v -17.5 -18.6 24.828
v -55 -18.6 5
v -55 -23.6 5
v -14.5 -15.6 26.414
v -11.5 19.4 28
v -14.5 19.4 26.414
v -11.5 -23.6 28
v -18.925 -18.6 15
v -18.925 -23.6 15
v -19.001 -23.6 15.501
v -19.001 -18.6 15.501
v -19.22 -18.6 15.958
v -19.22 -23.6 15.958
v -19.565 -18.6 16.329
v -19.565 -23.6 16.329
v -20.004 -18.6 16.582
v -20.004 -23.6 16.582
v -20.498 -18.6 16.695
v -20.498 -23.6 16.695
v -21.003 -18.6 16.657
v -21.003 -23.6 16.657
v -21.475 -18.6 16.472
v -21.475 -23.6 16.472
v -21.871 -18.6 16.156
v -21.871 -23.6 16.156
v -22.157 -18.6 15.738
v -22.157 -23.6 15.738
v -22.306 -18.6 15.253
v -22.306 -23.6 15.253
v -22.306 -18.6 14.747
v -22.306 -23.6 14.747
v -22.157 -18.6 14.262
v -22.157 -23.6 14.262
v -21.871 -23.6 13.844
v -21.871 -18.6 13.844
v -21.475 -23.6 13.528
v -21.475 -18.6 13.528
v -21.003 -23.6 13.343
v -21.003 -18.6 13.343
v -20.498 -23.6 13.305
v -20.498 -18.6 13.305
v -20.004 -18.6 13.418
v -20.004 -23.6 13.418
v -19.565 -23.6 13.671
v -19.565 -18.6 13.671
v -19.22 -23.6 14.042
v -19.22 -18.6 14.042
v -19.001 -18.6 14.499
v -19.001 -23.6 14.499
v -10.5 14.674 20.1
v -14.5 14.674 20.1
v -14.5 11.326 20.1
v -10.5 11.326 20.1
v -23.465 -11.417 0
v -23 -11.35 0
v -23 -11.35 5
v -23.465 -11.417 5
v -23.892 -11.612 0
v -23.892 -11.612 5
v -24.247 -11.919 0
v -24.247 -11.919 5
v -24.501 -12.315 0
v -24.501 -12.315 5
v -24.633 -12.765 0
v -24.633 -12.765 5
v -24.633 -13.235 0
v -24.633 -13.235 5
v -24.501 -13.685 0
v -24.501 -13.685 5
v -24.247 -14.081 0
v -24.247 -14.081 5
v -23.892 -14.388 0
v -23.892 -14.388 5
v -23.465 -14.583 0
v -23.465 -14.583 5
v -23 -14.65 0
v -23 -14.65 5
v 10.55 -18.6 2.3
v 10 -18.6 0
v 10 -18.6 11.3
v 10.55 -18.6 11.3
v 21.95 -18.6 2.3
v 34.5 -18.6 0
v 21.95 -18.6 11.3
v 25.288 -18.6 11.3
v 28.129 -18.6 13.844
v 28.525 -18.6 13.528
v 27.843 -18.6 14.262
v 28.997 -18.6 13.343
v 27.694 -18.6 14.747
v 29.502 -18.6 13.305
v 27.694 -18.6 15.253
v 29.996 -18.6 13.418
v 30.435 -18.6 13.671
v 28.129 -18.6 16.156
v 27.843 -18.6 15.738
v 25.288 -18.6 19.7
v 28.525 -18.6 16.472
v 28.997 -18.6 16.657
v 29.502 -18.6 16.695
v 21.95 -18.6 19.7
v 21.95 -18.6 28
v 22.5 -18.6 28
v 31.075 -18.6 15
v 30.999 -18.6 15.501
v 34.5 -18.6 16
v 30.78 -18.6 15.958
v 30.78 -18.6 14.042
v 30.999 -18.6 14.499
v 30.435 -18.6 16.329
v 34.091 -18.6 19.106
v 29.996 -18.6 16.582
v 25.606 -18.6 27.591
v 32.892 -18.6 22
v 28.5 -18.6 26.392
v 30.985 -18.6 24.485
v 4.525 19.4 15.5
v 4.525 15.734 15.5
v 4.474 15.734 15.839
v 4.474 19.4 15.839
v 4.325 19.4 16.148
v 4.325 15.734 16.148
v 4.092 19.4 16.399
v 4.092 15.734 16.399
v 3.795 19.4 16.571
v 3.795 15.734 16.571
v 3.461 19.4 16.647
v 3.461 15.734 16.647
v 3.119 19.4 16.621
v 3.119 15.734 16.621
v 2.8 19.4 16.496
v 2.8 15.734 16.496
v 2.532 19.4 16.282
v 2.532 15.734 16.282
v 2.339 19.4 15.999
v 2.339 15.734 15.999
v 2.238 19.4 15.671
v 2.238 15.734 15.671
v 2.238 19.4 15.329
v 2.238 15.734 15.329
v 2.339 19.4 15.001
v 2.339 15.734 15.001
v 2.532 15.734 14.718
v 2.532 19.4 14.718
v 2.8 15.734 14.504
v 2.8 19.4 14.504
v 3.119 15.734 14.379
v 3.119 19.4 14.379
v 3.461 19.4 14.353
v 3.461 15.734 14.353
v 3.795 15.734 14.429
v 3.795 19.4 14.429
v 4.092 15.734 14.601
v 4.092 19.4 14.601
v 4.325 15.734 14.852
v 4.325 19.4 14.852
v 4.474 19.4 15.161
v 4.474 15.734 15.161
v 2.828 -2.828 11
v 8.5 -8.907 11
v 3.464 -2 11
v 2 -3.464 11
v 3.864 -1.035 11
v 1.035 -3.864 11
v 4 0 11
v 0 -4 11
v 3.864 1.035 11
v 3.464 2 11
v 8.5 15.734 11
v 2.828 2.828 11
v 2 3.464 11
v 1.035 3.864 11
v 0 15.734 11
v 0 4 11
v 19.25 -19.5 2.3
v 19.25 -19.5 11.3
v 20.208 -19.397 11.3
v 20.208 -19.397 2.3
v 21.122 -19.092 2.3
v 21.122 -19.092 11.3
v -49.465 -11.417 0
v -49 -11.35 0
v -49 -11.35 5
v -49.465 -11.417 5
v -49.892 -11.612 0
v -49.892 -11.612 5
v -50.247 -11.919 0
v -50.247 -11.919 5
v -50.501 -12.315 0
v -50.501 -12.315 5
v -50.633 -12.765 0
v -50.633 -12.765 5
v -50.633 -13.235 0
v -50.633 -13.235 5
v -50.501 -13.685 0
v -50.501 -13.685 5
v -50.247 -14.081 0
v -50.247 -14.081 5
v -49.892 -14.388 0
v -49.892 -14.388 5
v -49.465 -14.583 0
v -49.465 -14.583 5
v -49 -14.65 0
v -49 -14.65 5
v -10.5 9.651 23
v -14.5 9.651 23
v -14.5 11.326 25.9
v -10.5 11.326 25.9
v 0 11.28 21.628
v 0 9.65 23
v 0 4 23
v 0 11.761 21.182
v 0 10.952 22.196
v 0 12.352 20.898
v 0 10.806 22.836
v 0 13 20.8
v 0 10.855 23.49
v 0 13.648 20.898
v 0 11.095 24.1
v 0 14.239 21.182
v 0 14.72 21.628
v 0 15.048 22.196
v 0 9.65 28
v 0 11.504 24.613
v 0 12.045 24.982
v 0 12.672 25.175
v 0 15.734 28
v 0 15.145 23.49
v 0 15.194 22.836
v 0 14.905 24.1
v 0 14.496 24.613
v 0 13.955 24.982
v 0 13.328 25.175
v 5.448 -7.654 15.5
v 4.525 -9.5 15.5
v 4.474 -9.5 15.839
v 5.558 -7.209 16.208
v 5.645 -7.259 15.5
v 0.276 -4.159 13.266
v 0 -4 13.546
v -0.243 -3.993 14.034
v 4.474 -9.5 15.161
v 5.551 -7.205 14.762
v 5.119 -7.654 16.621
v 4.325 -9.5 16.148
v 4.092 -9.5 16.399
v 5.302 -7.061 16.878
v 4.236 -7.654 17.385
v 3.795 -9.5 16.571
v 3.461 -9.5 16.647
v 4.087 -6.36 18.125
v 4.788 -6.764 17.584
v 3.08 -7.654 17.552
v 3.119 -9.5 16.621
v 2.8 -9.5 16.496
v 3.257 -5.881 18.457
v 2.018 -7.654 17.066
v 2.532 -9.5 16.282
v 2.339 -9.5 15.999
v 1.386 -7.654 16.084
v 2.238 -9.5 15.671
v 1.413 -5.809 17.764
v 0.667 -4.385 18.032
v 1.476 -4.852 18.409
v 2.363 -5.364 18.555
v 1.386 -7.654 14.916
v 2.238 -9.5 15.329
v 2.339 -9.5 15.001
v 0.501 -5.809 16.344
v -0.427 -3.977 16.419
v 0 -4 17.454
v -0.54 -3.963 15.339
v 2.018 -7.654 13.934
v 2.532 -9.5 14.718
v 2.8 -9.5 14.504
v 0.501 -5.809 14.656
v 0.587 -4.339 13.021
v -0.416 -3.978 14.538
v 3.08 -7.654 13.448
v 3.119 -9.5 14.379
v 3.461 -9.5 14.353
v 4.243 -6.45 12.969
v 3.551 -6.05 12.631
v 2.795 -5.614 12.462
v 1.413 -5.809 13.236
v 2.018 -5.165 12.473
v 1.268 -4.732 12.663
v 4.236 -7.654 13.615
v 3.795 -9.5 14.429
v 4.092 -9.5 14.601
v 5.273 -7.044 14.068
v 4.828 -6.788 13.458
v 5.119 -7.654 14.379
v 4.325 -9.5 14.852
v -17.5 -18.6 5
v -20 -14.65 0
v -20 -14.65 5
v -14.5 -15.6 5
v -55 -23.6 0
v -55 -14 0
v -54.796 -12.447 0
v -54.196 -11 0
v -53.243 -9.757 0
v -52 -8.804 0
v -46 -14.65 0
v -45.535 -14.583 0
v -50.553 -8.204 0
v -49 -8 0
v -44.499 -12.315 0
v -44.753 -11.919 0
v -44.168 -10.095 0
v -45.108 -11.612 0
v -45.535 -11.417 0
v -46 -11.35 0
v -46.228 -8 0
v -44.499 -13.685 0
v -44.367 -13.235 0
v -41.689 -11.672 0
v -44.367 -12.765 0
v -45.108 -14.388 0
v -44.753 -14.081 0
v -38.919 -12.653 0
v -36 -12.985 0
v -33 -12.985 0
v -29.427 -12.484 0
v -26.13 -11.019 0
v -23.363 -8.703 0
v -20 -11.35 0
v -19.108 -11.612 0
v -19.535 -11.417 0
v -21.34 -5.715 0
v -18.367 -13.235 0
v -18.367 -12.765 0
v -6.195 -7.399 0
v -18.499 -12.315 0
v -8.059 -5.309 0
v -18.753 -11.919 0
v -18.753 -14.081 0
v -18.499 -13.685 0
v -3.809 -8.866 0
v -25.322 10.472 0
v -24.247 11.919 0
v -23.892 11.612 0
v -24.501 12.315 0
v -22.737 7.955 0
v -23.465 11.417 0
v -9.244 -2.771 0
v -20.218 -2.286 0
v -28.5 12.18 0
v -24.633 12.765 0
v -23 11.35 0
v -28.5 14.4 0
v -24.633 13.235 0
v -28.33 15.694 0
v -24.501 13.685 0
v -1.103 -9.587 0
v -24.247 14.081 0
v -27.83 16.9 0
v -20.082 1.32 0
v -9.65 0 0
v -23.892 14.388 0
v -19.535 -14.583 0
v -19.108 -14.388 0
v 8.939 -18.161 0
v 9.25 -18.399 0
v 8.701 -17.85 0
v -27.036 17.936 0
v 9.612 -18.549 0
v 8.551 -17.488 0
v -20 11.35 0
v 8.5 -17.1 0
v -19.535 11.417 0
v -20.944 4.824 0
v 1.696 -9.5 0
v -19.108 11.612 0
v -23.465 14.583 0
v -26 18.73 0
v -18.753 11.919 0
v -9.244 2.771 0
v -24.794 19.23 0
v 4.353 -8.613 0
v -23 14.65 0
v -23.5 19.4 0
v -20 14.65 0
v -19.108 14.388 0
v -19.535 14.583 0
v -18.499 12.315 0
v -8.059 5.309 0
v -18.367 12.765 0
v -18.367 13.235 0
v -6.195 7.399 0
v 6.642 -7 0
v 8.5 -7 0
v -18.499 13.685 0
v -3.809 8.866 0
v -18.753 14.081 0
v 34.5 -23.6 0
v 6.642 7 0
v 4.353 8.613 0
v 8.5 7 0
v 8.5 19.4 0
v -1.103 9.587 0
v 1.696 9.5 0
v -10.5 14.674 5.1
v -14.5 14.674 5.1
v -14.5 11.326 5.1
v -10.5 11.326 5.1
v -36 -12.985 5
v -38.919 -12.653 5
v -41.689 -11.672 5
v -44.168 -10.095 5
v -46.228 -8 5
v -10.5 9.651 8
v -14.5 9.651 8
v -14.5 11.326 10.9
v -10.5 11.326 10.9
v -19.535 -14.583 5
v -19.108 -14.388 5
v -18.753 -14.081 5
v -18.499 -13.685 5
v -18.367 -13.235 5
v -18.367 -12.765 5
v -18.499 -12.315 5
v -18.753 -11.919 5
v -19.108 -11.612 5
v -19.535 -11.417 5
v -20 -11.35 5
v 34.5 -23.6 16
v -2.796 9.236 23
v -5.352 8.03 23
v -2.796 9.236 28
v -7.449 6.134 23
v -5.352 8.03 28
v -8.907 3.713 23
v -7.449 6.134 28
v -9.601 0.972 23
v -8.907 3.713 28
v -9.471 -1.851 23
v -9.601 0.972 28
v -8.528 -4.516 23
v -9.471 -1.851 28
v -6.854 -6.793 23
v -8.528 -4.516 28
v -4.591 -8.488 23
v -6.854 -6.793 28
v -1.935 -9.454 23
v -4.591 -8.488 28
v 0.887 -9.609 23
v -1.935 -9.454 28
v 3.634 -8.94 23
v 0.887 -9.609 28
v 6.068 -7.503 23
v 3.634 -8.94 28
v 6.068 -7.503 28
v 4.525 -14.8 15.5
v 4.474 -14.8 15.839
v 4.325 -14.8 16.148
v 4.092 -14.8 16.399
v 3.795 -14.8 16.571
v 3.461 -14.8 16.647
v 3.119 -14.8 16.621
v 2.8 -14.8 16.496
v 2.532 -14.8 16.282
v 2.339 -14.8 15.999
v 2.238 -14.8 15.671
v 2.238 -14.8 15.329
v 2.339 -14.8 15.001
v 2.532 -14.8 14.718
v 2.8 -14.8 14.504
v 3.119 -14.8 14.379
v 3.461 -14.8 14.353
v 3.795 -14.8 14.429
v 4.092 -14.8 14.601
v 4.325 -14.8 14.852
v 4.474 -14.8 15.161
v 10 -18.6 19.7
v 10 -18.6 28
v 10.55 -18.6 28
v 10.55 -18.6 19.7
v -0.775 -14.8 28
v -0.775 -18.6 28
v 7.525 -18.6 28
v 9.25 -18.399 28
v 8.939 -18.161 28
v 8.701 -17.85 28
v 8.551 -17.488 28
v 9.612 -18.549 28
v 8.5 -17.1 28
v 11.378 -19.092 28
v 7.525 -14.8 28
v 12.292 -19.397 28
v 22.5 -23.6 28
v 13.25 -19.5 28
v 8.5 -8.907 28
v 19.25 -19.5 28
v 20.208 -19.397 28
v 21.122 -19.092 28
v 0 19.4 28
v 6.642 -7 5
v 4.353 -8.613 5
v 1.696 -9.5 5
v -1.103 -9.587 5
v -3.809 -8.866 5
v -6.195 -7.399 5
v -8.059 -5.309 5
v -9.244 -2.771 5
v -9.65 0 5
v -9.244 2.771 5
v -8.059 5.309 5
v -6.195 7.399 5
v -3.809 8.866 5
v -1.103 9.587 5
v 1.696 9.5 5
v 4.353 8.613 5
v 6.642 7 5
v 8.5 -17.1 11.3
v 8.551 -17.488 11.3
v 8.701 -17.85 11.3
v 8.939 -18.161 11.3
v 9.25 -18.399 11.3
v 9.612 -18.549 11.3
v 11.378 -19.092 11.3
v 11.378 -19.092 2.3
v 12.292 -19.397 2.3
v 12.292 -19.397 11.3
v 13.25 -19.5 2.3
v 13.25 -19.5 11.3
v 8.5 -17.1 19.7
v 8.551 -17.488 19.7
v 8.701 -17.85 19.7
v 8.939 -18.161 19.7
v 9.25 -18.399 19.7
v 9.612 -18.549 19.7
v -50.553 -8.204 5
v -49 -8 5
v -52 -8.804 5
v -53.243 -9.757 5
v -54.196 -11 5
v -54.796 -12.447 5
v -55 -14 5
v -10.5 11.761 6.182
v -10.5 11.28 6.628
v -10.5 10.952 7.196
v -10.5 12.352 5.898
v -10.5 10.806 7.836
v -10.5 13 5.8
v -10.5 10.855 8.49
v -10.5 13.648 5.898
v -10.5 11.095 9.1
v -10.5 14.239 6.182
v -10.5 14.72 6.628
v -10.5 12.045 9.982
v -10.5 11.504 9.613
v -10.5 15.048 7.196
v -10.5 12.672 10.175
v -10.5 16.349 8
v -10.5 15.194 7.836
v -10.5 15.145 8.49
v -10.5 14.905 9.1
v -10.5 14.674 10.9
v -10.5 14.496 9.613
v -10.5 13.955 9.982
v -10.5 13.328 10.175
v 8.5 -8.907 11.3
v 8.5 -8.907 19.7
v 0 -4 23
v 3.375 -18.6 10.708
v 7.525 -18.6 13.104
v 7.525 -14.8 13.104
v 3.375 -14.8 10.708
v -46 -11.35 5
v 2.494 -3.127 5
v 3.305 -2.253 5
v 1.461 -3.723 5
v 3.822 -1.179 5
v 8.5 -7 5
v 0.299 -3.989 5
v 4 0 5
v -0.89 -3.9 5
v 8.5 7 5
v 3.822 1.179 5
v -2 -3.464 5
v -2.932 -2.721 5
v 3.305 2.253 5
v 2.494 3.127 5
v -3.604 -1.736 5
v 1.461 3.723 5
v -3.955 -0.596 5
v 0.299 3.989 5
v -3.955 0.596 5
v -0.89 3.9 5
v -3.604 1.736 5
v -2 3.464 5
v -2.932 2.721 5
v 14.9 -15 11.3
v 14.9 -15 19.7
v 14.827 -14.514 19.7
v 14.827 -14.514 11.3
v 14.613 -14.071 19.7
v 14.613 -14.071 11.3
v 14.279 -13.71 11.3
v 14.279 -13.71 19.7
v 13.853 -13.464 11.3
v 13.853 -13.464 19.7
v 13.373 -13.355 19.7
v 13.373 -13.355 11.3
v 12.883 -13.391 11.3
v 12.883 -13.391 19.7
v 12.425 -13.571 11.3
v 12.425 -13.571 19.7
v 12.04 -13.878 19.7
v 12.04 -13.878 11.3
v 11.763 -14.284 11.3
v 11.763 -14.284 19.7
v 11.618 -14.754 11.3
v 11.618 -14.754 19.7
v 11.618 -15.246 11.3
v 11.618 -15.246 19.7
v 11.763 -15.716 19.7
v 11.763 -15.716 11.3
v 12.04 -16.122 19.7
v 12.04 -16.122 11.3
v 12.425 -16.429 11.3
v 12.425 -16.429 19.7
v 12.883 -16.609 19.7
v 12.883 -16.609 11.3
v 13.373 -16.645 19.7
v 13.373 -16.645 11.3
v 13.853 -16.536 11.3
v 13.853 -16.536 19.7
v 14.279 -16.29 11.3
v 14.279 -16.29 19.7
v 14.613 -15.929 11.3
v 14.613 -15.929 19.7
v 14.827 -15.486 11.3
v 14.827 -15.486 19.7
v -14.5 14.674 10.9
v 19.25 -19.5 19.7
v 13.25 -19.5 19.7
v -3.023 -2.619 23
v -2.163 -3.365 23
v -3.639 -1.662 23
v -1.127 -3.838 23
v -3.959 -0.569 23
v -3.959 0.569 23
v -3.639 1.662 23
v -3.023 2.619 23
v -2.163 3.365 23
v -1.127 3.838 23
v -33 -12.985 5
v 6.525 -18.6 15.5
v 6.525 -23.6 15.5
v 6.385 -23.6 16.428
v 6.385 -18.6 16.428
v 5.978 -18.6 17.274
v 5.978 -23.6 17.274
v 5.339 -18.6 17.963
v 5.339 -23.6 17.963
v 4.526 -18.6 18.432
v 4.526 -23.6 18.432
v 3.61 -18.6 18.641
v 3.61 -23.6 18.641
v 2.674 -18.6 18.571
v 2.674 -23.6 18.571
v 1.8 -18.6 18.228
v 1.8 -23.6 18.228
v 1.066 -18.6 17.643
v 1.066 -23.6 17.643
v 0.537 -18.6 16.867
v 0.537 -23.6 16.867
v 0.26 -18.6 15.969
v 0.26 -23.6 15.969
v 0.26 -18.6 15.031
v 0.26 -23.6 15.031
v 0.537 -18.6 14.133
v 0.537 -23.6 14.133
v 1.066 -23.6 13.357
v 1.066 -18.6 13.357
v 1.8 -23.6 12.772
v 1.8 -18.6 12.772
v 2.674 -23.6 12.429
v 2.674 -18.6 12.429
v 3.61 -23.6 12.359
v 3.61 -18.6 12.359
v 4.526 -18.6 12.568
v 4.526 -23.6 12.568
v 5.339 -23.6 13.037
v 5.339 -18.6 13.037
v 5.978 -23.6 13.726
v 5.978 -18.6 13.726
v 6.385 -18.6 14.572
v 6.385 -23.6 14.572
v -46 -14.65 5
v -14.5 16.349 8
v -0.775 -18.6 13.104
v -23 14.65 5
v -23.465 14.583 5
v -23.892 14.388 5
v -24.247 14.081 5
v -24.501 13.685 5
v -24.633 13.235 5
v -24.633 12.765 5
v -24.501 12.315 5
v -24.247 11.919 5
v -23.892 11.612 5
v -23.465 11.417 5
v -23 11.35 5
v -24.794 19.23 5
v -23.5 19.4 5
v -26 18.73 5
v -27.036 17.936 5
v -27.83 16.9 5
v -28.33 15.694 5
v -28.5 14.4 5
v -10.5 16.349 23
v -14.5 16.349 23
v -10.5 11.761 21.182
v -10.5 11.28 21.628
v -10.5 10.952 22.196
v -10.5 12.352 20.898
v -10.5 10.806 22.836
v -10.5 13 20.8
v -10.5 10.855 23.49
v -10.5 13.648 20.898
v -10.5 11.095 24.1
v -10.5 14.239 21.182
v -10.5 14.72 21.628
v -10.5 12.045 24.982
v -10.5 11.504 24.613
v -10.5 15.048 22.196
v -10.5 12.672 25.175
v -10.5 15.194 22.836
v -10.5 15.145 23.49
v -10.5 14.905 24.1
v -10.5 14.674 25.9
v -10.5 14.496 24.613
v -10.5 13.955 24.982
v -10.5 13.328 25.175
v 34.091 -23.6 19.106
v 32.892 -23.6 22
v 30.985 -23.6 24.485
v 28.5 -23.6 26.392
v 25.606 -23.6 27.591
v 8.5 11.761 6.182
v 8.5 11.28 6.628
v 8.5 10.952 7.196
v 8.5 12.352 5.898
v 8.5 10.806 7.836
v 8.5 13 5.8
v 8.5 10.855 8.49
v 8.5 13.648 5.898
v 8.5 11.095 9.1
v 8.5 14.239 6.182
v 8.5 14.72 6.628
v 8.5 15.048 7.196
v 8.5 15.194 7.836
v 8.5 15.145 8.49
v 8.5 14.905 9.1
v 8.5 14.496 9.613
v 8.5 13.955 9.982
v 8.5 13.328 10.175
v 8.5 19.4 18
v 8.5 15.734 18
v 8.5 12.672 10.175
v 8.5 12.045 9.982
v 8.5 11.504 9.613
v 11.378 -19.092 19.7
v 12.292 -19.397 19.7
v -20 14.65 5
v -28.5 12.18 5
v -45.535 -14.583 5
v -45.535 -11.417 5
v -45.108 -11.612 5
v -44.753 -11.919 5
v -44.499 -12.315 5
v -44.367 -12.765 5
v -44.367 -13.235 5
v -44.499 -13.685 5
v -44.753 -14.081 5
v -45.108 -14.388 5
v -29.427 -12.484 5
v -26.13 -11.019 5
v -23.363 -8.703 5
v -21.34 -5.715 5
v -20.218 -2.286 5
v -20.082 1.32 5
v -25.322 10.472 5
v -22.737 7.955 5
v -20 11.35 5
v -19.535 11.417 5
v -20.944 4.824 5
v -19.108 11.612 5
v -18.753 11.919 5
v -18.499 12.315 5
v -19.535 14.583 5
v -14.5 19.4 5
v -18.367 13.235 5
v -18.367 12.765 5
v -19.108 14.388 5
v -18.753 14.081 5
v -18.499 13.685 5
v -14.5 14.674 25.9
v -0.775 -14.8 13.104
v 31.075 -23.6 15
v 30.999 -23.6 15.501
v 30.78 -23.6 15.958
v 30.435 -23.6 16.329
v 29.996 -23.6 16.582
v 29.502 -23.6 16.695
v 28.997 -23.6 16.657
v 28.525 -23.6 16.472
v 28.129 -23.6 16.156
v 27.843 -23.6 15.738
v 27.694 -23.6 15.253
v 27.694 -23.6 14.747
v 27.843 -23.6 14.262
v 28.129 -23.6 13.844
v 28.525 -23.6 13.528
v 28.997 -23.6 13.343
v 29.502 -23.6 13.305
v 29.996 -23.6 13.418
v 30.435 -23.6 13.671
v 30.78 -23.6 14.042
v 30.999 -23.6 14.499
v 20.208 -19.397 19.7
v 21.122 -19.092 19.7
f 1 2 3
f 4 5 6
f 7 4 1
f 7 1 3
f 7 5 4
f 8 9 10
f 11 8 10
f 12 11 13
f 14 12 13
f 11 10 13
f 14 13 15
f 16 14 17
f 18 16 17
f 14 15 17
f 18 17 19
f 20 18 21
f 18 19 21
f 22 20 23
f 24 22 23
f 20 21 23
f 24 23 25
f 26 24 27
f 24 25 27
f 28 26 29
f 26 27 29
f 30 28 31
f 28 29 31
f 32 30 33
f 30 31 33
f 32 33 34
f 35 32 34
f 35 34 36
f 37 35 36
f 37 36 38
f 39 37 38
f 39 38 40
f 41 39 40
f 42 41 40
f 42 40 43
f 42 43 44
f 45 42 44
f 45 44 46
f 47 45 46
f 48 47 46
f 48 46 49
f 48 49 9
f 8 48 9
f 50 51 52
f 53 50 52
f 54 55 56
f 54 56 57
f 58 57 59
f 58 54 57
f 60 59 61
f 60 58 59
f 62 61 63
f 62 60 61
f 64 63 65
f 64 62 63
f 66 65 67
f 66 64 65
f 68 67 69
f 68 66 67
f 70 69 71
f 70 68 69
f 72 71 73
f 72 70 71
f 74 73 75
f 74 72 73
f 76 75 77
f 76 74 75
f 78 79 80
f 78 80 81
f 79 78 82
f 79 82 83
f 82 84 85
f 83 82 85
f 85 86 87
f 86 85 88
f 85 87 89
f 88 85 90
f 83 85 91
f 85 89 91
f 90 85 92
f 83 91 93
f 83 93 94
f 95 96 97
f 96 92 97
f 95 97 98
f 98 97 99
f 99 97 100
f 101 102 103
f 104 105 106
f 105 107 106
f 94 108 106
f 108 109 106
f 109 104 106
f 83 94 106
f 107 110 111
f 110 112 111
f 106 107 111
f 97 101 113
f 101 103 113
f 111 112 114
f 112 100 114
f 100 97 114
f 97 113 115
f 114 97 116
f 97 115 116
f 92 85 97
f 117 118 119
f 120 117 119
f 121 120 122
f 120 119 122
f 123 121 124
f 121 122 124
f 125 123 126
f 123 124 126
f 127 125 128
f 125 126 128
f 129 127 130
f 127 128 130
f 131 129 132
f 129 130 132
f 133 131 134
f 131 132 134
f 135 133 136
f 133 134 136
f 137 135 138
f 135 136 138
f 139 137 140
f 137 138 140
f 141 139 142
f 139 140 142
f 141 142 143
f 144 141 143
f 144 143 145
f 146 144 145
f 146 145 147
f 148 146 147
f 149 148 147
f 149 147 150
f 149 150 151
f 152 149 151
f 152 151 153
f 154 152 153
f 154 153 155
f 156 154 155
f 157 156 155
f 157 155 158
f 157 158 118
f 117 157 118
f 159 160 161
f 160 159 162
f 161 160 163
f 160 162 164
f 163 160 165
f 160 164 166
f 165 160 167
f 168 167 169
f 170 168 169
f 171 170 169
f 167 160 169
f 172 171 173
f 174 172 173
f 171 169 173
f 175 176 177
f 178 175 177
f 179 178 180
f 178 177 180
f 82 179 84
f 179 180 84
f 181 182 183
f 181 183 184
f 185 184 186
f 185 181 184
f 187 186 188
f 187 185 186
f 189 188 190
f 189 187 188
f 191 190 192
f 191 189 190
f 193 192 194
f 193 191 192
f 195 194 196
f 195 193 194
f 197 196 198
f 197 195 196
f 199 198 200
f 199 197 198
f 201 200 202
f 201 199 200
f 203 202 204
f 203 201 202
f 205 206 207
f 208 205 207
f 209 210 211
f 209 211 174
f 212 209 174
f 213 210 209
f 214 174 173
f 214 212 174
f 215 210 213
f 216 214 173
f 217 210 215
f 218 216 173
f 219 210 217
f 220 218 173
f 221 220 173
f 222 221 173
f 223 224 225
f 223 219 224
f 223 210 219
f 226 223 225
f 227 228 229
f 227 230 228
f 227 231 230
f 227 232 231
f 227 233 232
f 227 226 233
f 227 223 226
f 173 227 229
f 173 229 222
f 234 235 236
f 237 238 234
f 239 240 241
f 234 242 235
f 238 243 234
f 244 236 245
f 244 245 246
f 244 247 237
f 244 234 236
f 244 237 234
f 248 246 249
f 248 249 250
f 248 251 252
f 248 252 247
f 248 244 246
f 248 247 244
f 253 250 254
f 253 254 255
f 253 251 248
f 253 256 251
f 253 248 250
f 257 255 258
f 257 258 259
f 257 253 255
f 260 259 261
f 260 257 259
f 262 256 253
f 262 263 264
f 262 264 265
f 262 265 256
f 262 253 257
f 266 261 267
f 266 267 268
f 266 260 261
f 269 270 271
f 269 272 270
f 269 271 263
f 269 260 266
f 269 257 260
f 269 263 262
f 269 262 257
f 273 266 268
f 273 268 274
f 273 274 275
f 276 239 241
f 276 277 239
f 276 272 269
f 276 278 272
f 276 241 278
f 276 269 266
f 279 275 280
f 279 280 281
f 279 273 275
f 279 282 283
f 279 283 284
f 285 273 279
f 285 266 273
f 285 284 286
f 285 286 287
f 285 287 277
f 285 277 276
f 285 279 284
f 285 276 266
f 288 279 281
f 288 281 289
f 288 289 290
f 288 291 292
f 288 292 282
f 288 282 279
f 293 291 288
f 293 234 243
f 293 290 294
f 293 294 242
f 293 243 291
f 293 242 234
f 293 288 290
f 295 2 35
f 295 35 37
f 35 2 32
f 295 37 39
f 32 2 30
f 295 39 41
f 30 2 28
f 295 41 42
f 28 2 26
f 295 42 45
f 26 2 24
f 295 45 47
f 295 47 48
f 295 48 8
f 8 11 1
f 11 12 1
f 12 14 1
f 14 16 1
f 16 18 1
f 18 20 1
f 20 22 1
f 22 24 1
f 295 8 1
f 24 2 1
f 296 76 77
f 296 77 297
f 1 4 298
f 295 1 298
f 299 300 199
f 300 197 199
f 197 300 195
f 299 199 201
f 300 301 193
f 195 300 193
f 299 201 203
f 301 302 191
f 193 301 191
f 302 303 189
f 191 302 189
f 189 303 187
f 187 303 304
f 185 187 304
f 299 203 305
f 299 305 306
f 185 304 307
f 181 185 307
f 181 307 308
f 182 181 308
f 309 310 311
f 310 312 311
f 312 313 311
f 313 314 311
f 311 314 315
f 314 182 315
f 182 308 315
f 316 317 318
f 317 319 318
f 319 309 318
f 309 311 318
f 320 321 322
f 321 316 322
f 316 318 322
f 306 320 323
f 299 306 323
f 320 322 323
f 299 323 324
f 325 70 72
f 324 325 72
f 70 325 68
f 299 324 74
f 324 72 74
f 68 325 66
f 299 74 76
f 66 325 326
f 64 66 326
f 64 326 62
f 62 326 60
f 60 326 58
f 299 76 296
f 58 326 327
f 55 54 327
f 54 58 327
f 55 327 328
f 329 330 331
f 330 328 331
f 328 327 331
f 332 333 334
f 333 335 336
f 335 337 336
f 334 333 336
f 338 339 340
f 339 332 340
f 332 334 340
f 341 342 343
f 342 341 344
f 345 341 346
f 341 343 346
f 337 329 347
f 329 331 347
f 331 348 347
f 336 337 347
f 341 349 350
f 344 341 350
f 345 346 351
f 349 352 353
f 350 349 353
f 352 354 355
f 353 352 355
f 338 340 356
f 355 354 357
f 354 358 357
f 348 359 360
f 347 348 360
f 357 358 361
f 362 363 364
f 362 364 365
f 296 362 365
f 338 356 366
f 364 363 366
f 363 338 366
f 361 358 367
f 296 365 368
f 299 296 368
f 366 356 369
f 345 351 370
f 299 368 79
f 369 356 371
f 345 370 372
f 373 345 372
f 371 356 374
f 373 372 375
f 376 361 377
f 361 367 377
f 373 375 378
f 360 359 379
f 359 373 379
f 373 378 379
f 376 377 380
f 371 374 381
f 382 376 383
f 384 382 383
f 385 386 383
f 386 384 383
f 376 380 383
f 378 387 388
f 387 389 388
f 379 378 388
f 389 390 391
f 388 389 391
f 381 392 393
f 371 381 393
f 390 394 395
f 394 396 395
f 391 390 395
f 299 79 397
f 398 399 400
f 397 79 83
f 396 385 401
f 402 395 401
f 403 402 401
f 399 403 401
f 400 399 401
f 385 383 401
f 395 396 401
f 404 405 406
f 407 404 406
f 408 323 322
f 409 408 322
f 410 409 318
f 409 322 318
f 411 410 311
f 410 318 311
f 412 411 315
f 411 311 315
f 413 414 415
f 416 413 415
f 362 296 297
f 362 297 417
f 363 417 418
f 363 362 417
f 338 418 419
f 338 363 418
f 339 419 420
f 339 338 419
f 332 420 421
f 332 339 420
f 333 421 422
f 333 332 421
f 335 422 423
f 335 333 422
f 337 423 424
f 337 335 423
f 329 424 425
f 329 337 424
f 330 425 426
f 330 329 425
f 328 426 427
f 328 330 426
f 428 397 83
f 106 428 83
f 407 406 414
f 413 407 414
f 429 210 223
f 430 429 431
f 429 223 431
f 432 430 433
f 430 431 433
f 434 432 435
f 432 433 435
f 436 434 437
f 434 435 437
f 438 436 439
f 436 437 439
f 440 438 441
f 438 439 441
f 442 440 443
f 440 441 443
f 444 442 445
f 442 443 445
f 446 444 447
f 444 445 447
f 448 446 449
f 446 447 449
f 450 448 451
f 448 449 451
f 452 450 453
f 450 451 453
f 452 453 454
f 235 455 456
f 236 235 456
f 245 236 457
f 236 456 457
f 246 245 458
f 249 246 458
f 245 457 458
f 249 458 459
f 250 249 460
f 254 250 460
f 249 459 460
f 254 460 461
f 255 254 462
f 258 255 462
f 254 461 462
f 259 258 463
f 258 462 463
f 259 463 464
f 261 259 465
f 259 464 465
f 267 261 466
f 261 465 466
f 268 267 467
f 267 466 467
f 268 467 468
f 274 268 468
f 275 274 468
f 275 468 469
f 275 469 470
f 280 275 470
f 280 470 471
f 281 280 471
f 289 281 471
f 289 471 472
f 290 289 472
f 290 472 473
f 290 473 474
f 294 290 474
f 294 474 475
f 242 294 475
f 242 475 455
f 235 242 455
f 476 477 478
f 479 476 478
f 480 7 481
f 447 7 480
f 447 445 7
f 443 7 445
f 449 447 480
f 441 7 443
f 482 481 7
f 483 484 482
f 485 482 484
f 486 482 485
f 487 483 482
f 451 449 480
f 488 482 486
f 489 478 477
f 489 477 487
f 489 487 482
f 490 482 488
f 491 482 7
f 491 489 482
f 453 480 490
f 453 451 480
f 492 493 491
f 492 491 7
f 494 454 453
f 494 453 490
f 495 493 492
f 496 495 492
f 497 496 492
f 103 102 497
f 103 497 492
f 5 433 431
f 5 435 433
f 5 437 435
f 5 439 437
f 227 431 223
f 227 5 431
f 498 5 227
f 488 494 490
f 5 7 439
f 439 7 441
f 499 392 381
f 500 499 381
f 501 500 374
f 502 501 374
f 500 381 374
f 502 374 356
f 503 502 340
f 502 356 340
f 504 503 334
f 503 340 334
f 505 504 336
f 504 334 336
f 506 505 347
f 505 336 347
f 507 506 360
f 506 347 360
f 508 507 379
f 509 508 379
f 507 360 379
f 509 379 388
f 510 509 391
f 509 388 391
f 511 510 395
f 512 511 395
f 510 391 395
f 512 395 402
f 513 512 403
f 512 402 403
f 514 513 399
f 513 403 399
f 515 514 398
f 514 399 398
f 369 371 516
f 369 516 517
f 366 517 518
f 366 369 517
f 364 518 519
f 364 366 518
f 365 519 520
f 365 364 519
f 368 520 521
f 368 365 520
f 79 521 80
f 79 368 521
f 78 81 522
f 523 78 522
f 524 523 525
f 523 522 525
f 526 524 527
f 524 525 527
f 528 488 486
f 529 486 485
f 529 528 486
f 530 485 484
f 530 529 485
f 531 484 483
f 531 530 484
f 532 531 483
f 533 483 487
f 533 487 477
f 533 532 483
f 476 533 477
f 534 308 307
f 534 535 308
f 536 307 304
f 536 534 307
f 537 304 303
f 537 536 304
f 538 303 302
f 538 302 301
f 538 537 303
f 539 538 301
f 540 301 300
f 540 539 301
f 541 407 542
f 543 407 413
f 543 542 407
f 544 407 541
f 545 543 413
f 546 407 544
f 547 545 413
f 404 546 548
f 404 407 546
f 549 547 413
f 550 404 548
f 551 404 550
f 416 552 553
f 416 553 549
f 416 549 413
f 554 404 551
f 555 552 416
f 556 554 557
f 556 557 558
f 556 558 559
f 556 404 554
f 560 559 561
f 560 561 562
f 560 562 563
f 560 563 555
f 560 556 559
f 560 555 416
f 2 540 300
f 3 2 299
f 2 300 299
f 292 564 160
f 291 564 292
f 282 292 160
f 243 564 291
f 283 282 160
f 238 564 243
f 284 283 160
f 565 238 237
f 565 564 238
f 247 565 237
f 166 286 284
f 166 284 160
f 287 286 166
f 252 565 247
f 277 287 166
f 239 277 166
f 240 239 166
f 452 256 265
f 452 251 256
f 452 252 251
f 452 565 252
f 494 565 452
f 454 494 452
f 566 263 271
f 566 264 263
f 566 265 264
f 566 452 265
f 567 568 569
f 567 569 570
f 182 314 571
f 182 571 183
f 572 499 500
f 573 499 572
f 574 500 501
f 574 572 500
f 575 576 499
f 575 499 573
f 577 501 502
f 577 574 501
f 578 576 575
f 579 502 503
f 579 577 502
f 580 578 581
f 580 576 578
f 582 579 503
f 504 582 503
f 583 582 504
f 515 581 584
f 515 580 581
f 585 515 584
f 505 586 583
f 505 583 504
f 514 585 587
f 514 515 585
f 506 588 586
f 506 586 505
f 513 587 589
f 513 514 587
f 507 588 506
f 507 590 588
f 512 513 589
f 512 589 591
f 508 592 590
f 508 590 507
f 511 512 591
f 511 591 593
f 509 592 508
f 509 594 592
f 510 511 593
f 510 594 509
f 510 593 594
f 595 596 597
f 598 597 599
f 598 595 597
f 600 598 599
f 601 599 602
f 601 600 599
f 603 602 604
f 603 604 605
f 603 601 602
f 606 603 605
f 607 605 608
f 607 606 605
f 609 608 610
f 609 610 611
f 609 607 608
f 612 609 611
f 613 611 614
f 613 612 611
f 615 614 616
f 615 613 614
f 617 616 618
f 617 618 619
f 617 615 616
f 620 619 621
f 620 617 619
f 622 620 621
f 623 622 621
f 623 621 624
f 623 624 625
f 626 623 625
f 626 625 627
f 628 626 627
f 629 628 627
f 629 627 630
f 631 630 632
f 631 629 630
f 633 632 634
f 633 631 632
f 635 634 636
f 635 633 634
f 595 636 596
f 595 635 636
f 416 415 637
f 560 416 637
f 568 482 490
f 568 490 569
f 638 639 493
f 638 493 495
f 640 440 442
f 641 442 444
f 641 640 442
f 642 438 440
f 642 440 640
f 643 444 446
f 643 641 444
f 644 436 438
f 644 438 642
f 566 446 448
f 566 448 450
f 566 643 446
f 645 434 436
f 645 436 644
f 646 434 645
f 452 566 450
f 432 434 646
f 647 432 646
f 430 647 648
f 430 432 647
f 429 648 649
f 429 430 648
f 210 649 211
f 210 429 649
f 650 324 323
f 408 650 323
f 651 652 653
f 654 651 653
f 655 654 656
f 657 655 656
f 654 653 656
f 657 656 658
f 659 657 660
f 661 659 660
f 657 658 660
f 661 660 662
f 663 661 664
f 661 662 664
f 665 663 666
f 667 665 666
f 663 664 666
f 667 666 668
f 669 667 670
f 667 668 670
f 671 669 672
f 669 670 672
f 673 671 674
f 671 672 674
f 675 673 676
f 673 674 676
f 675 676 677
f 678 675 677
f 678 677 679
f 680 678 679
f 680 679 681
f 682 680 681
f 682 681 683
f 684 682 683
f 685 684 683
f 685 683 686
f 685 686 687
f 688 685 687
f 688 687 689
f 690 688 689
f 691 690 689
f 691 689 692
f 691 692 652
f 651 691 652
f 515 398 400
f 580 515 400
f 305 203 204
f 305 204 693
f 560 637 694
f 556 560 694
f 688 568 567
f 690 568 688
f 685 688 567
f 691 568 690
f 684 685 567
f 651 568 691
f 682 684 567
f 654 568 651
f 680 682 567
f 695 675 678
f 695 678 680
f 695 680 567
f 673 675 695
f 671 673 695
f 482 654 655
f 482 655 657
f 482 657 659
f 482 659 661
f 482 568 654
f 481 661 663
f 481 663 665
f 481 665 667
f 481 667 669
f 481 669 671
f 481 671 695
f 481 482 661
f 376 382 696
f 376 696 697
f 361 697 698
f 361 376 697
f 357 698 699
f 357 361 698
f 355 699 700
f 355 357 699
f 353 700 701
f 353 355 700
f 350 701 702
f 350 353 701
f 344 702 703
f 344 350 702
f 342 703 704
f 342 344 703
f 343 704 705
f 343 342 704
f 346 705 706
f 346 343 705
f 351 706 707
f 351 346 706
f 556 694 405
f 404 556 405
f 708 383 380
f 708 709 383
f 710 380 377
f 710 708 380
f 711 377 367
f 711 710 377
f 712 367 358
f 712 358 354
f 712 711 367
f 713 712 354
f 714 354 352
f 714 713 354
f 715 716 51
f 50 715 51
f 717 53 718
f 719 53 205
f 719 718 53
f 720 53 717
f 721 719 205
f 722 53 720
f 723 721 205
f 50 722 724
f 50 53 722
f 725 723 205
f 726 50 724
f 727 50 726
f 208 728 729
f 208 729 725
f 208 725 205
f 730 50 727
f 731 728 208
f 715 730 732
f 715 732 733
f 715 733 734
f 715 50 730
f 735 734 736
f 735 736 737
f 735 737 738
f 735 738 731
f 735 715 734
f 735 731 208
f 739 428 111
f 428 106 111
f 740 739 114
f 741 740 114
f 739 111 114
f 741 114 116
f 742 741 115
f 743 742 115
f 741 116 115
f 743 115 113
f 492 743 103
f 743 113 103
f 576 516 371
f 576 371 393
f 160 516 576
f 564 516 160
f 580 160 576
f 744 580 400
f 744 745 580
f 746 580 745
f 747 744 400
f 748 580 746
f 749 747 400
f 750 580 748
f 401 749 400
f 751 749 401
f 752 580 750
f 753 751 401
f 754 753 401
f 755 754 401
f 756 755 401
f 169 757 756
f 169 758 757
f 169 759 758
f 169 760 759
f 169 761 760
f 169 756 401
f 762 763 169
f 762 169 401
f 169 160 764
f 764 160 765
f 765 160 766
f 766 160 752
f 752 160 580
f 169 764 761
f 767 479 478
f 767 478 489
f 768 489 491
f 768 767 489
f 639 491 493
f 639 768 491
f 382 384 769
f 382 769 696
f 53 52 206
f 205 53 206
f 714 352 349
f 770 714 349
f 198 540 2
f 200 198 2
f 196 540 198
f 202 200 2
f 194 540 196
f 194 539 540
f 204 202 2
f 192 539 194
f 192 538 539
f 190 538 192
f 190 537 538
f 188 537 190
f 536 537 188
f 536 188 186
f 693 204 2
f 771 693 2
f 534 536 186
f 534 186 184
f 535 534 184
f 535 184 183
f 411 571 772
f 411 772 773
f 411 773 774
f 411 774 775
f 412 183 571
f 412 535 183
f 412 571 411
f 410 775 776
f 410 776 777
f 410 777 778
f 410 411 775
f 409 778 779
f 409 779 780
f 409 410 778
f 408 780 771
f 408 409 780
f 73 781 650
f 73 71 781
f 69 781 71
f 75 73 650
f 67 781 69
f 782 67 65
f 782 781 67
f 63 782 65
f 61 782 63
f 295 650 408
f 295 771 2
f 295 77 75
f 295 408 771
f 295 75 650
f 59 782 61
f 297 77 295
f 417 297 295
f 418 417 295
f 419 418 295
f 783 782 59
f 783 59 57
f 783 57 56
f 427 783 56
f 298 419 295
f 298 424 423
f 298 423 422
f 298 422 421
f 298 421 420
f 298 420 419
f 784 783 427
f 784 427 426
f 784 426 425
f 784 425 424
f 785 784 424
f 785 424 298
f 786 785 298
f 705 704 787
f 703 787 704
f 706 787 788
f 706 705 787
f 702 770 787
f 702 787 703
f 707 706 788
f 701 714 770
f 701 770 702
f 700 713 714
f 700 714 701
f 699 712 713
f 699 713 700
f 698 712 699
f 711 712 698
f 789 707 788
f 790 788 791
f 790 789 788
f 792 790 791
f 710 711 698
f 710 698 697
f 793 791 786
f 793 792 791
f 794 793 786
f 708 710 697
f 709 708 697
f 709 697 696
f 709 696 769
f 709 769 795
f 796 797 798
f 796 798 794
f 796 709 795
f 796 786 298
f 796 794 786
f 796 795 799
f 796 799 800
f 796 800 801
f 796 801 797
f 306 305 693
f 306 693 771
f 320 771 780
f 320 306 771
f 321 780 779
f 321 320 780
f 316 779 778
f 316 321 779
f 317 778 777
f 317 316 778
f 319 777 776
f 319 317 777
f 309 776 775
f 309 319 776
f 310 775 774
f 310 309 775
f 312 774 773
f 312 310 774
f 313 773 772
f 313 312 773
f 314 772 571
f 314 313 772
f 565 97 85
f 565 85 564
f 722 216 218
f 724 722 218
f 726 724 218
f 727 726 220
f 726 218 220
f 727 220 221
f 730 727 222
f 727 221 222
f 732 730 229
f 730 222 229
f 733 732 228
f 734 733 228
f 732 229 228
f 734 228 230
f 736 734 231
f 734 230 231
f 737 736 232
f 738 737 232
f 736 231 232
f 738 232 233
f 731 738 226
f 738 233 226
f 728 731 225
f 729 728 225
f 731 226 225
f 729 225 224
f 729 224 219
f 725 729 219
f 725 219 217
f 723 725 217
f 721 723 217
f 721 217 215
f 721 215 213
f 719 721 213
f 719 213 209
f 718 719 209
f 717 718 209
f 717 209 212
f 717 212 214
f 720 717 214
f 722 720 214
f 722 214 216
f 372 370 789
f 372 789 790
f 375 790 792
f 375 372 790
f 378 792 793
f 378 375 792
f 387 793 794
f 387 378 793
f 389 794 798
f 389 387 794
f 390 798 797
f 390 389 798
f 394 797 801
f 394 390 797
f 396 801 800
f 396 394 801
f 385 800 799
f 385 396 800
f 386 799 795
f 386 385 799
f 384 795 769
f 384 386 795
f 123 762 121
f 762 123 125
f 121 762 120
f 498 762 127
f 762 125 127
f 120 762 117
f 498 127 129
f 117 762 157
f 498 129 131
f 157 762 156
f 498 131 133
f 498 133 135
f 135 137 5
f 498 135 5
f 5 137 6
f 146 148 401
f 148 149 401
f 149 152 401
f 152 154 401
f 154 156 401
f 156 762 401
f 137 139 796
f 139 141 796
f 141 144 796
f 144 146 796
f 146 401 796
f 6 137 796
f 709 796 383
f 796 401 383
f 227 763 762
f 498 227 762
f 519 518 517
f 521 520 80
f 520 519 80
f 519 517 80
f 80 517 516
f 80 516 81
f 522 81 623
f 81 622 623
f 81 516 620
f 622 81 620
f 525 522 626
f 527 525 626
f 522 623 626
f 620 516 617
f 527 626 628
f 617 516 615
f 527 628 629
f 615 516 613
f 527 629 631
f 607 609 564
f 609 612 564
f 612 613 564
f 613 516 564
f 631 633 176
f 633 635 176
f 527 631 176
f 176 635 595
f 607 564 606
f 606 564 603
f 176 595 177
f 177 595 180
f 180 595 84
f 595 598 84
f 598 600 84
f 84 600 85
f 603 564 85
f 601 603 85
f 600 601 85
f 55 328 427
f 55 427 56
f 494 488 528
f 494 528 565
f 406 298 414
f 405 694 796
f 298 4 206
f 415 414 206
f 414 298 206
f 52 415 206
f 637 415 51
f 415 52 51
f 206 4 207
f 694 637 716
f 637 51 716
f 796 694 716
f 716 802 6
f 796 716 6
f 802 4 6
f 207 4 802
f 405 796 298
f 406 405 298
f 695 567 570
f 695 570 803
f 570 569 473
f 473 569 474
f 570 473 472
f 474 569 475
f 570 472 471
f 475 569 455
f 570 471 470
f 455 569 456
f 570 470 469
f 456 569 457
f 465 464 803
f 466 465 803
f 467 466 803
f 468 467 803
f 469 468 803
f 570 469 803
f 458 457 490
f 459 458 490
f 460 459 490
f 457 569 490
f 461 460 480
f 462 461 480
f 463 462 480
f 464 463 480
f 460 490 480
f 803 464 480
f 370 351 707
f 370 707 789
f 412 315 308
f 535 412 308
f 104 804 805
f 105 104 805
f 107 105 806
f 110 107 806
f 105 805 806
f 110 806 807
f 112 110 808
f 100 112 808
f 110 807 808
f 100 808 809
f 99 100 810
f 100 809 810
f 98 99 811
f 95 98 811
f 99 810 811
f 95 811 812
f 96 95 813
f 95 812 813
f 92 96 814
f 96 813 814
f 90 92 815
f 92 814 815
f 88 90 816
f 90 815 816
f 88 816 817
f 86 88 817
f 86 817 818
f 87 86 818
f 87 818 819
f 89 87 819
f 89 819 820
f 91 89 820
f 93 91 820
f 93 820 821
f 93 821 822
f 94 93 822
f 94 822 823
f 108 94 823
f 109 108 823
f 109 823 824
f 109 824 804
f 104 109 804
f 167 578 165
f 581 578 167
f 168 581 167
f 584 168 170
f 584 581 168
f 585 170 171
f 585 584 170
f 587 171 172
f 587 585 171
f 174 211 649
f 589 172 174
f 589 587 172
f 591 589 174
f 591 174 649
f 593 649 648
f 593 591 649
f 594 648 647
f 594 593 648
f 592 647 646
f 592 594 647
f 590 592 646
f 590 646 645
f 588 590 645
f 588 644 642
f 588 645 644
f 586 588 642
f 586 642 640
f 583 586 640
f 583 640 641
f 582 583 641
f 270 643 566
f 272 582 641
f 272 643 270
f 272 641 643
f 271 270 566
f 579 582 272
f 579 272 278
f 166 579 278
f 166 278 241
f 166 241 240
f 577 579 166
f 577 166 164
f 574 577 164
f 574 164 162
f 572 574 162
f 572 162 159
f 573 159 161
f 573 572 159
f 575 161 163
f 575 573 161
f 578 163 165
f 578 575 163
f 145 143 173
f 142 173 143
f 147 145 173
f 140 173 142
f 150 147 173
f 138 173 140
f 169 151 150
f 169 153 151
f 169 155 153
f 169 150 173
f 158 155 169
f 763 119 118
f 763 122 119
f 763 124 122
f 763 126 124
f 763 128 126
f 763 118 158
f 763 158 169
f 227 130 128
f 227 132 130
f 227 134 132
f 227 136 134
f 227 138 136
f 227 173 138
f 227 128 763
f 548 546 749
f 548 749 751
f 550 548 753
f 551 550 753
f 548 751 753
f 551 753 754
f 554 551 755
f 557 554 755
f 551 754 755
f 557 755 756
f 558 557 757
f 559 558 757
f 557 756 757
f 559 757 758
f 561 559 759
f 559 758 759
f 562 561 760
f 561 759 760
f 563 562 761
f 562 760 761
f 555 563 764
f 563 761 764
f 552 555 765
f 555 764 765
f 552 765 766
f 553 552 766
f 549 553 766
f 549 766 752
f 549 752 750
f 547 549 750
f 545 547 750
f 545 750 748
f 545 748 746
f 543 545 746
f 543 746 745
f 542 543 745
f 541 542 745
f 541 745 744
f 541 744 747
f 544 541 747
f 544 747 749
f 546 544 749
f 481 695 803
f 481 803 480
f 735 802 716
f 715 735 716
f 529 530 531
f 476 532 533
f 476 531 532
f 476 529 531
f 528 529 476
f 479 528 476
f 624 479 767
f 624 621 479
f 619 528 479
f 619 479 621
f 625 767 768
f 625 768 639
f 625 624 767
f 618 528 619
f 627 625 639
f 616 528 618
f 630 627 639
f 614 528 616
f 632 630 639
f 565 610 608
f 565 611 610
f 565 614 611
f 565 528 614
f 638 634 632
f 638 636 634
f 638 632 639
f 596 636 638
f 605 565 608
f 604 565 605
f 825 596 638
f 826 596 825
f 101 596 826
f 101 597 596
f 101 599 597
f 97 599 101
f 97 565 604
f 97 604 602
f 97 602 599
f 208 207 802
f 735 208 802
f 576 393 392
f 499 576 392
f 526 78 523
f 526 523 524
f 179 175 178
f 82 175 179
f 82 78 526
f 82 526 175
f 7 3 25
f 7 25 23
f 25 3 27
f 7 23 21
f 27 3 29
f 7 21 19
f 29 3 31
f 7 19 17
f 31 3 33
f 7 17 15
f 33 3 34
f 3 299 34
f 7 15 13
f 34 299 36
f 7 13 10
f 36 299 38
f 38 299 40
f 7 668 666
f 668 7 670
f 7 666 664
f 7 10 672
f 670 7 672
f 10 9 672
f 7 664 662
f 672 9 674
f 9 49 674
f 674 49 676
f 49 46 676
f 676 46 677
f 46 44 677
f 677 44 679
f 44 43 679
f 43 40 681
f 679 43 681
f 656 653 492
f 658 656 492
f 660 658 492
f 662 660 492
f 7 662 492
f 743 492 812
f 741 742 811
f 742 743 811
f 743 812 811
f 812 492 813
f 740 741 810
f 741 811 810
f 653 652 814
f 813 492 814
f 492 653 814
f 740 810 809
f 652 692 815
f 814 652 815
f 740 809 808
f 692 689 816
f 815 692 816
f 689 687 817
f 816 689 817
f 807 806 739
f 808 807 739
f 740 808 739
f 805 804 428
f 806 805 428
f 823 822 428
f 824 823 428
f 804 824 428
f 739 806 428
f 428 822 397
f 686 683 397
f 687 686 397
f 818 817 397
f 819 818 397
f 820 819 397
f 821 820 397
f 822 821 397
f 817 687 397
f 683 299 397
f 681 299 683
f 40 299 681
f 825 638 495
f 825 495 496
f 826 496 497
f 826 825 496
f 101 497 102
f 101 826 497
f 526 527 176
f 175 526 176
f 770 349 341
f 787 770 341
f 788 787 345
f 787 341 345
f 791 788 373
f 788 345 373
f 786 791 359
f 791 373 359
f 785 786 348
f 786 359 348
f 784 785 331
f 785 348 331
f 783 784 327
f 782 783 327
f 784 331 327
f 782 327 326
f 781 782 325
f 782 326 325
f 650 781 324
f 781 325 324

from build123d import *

# Parameters (mm, degrees)
SKETCH1_R                = 4
BOSS_EXTRUDE1_DEPTH      = 28
SKETCH2_W                = 40.5
SKETCH2_H                = 38
CUT_EXTRUDE1_DEPTH       = 23
SKETCH3_R                = 9.65
CUT_EXTRUDE2_DEPTH       = 5
SKETCH8_R                = 1.15
CUT_EXTRUDE7_DEPTH       = 44
CHAMFER1_SIZE            = 23
CHAMFER1_SIZE2           = 43.5
SKETCH9_R                = 2.2
CUT_EXTRUDE8_DEPTH       = 90.5
CUT_EXTRUDE9_DEPTH       = 3
CUT_EXTRUDE9_DEPTH_BACK  = 4
CHAMFER2_SIZE            = 3
SKETCH16_W               = 26
SKETCH16_H               = 38
CUT_EXTRUDE12_DEPTH      = 29.0000001
CUT_EXTRUDE3_DEPTH       = 5
FILLET6_R                = 1.5
CUT_EXTRUDE13_DEPTH      = 17
SKETCH21_R               = 1.65
BOSS_EXTRUDE3_DEPTH      = 4.2
BOSS_EXTRUDE3_DEPTH_BACK = 4.2
SKETCH15_R               = 1.7
CUT_EXTRUDE11_DEPTH      = 44
CUT_EXTRUDE14_DEPTH      = 9
CHAMFER4_SIZE            = 8.5
CHAMFER4_SIZE2           = 10
FILLET1_R                = 5
FILLET2_R                = 6
FILLET4_R                = 12
CUT_EXTRUDE15_DEPTH      = 3.8
CUT_EXTRUDE18_REACH      = 45
SKETCH26_R               = 3.15


with BuildPart() as part:
    # Sketch1 → Boss-Extrude1 (new body)
    with BuildSketch(Plane.XY):
        with BuildLine():
            Line((-55, -23.6), (34.5, -23.6))
            Line((34.5, -23.6), (34.5, 19.4))
            Line((34.5, 19.4), (-28.5, 19.4))
            Line((-28.5, 19.4), (-28.5, 12.180409823))
            ThreePointArc((-28.5, 12.180409823), (-20.217668105, -2.285689125), (-33, -12.985083113))
            Line((-33, -12.985083113), (-36, -12.985083113))
            ThreePointArc((-36, -12.985083113), (-41.689100041, -11.672468641), (-46.228019527, -8))
            Line((-46.228019527, -8), (-55, -8))
            Line((-55, -8), (-55, -23.6))
        make_face()
        Circle(SKETCH1_R, mode=Mode.SUBTRACT)
        with BuildLine():
            Line((-23, 11.35), (-20, 11.35))
            ThreePointArc((-20, 11.35), (-18.35, 13), (-20, 14.65))
            Line((-20, 14.65), (-23, 14.65))
            ThreePointArc((-23, 14.65), (-24.65, 13), (-23, 11.35))
        make_face(mode=Mode.SUBTRACT)
        with BuildLine():
            Line((-23, -14.65), (-20, -14.65))
            ThreePointArc((-20, -14.65), (-18.35, -13), (-20, -11.35))
            Line((-20, -11.35), (-23, -11.35))
            ThreePointArc((-23, -11.35), (-24.65, -13), (-23, -14.65))
        make_face(mode=Mode.SUBTRACT)
        with BuildLine():
            Line((-46, -11.35), (-49, -11.35))
            ThreePointArc((-49, -11.35), (-50.65, -13), (-49, -14.65))
            Line((-49, -14.65), (-46, -14.65))
            ThreePointArc((-46, -14.65), (-44.35, -13), (-46, -11.35))
        make_face(mode=Mode.SUBTRACT)
    extrude(amount=BOSS_EXTRUDE1_DEPTH)

    # Sketch2 → Cut-Extrude1 (cut)
    with BuildSketch(Plane.XY.offset(28)):
        with Locations((-34.75, 0.4)):
            Rectangle(SKETCH2_W, SKETCH2_H)
    extrude(amount=-CUT_EXTRUDE1_DEPTH, mode=Mode.SUBTRACT)

    # Sketch3 → Cut-Extrude2 (cut)
    with BuildSketch(Plane.XY.offset(28)):
        Circle(SKETCH3_R)
    extrude(amount=-CUT_EXTRUDE2_DEPTH, mode=Mode.SUBTRACT)

    # Sketch8 → Cut-Extrude7 (cut, through all)
    with BuildSketch(Plane.XZ.offset(23.6)):
        with Locations((3.375, 15.5)):
            Circle(SKETCH8_R)
    extrude(amount=-CUT_EXTRUDE7_DEPTH, mode=Mode.SUBTRACT)

    # Chamfer1
    chamfer1_edges = [part.edges().sort_by_distance(p)[0] for p in [
        (-55, -21.1, 28),
    ]]
    chamfer1_side = [part.faces().sort_by_distance(p)[0] for p in [
        (-55, -18.958031088, 10.841968912),
    ]]
    chamfer(chamfer1_edges, length=CHAMFER1_SIZE, length2=CHAMFER1_SIZE2, reference=chamfer1_side[0])

    # Sketch9 → Cut-Extrude8 (cut, through all)
    with BuildSketch(Plane(origin=(34.5, 0, 0), x_dir=(0, 0, -1), z_dir=(1, 0, 0))):
        with Locations((-8, 13)):
            Circle(SKETCH9_R)
        with Locations((-23, 13)):
            Circle(SKETCH9_R)
    extrude(amount=-CUT_EXTRUDE8_DEPTH, mode=Mode.SUBTRACT)

    # Sketch10 → Cut-Extrude9 (cut, two sides)
    with BuildSketch(Plane.ZY.offset(14.5)) as cut_extrude9_sk:
        Polygon((5.1, 14.674315781), (5.1, 11.325684219), (8, 9.651368439), (10.9, 11.325684219), (10.9, 14.674315781), (8, 16.348631561), align=None)
        Polygon((25.9, 11.325684219), (25.9, 14.674315781), (23, 16.348631561), (20.1, 14.674315781), (20.1, 11.325684219), (23, 9.651368439), align=None)
    extrude(amount=CUT_EXTRUDE9_DEPTH, mode=Mode.SUBTRACT)
    extrude(cut_extrude9_sk.sketch, amount=-CUT_EXTRUDE9_DEPTH_BACK, mode=Mode.SUBTRACT)

    # Chamfer2
    chamfer2_edges = [part.edges().sort_by_distance(p)[0] for p in [
        (-14.5, -18.6, 15.706896552),
    ]]
    chamfer(chamfer2_edges, length=CHAMFER2_SIZE)

    # Sketch16 → Cut-Extrude12 (cut, through all)
    with BuildSketch(Plane.XY.offset(28)):
        with Locations((21.5, 0.4)):
            Rectangle(SKETCH16_W, SKETCH16_H)
    extrude(amount=-CUT_EXTRUDE12_DEPTH, mode=Mode.SUBTRACT)

    # Sketch4 → Cut-Extrude3 (cut)
    with BuildSketch(Plane(origin=(0, 0, 0), x_dir=(-1, 0, 0), z_dir=(0, 0, -1))):
        with BuildLine():
            Line((-36.31147183, -7), (-6.642476948, -7))
            ThreePointArc((-6.642476948, -7), (9.65, 0), (-6.642476948, 7))
            Line((-6.642476948, 7), (-36.31147183, 7))
            Line((-36.31147183, 7), (-36.31147183, -7))
        make_face()
    extrude(amount=-CUT_EXTRUDE3_DEPTH, mode=Mode.SUBTRACT)

    # Fillet6
    fillet6_edges = [part.edges().sort_by_distance(p)[0] for p in [
        (8.5, -18.6, 14),
    ]]
    fillet(fillet6_edges, radius=FILLET6_R)

    # Sketch17 → Cut-Extrude13 (cut)
    with BuildSketch(Plane.XY.offset(28)):
        with BuildLine():
            Line((0, 4), (0, 15.733500455))
            Line((0, 15.733500455), (8.5, 15.733500455))
            Line((8.5, 15.733500455), (8.5, -8.907477288))
            Line((8.5, -8.907477288), (0, -4))
            ThreePointArc((0, -4), (4, 0), (0, 4))
        make_face()
    extrude(amount=-CUT_EXTRUDE13_DEPTH, mode=Mode.SUBTRACT)

    # Sketch20 → Cut-Revolve1 (revolve, cut)
    with BuildSketch(Plane.XY.offset(15.5)):
        Polygon((3.375, -11.8), (7.375, -3.8), (3.375, -3.8), align=None)
    revolve(axis=Axis((3.375, -3.8, 15.5), (0, -1, 0)), mode=Mode.SUBTRACT)

    # Sketch21 → Boss-Extrude3 (add, two sides)
    with BuildSketch(Plane.XY.offset(15.5)) as boss_extrude3_sk:
        Polygon((7.25, -8.185789452), (7.25, -18.6), (25.287941791, -18.6), align=None)
        with Locations((13.25, -15)):
            Circle(SKETCH21_R, mode=Mode.SUBTRACT)
    extrude(amount=BOSS_EXTRUDE3_DEPTH)
    extrude(boss_extrude3_sk.sketch, amount=-BOSS_EXTRUDE3_DEPTH_BACK)

    # Sketch15 → Cut-Extrude11 (cut, through all)
    with BuildSketch(Plane.XZ.offset(23.6)):
        with Locations((-20.625, 15)):
            Circle(SKETCH15_R)
        with Locations((29.375, 15)):
            Circle(SKETCH15_R)
    extrude(amount=-CUT_EXTRUDE11_DEPTH, mode=Mode.SUBTRACT)

    # Sketch22 → Cut-Extrude14 (cut)
    with BuildSketch(Plane.XY.offset(19.7)):
        with BuildLine():
            Line((13.25, -19.5), (19.25, -19.5))
            ThreePointArc((19.25, -19.5), (23.75, -15), (19.25, -10.5))
            Line((19.25, -10.5), (13.25, -10.5))
            ThreePointArc((13.25, -10.5), (8.75, -15), (13.25, -19.5))
        make_face()
    cut_extrude14 = extrude(amount=CUT_EXTRUDE14_DEPTH, mode=Mode.SUBTRACT)

    # Mirror1: Cut-Extrude14 across plane
    add(cut_extrude14.mirror(Plane.XY.offset(15.5)), mode=Mode.SUBTRACT)

    # Chamfer4
    chamfer4_edges = [part.edges().sort_by_distance(p)[0] for p in [
        (8.5, 17.566750228, 28),
    ]]
    chamfer4_side = [part.faces().sort_by_distance(p)[0] for p in [
        (7.87031754, -13.003738644, 28),
    ]]
    chamfer(chamfer4_edges, length=CHAMFER4_SIZE, length2=CHAMFER4_SIZE2, reference=chamfer4_side[0])

    # Fillet1
    fillet1_edges = [part.edges().sort_by_distance(p)[0] for p in [
        (-28.5, 19.4, 2.5),
    ]]
    fillet(fillet1_edges, radius=FILLET1_R)

    # Fillet2
    fillet2_edges = [part.edges().sort_by_distance(p)[0] for p in [
        (-55, -8, 2.5),
    ]]
    fillet(fillet2_edges, radius=FILLET2_R)

    # Fillet4
    fillet4_edges = [part.edges().sort_by_distance(p)[0] for p in [
        (34.5, -21.1, 28),
    ]]
    fillet(fillet4_edges, radius=FILLET4_R)

    # Sketch23 → Cut-Extrude15 (cut)
    with BuildSketch(Plane.XZ.offset(18.6)):
        Polygon((-0.775, 28.722034997), (7.525, 28.722034997), (7.525, 13.103996383), (3.375, 10.707992766), (-0.775, 13.103996383), align=None)
    extrude(amount=-CUT_EXTRUDE15_DEPTH, mode=Mode.SUBTRACT)

    # Sketch26 → Cut-Extrude18 (cut, up to next)
    with BuildSketch(Plane.XZ.offset(23.6), mode=Mode.PRIVATE) as cut_extrude18_sk1:
        with Locations((3.375, 15.5)):
            Circle(SKETCH26_R)
    cut_extrude18_tool1 = extrude(cut_extrude18_sk1.sketch, amount=-CUT_EXTRUDE18_REACH, mode=Mode.PRIVATE) & part.part
    add(cut_extrude18_tool1.solids().sort_by_distance((3.375, -23.6, 15.5))[0], mode=Mode.SUBTRACT)


solid = part.part
